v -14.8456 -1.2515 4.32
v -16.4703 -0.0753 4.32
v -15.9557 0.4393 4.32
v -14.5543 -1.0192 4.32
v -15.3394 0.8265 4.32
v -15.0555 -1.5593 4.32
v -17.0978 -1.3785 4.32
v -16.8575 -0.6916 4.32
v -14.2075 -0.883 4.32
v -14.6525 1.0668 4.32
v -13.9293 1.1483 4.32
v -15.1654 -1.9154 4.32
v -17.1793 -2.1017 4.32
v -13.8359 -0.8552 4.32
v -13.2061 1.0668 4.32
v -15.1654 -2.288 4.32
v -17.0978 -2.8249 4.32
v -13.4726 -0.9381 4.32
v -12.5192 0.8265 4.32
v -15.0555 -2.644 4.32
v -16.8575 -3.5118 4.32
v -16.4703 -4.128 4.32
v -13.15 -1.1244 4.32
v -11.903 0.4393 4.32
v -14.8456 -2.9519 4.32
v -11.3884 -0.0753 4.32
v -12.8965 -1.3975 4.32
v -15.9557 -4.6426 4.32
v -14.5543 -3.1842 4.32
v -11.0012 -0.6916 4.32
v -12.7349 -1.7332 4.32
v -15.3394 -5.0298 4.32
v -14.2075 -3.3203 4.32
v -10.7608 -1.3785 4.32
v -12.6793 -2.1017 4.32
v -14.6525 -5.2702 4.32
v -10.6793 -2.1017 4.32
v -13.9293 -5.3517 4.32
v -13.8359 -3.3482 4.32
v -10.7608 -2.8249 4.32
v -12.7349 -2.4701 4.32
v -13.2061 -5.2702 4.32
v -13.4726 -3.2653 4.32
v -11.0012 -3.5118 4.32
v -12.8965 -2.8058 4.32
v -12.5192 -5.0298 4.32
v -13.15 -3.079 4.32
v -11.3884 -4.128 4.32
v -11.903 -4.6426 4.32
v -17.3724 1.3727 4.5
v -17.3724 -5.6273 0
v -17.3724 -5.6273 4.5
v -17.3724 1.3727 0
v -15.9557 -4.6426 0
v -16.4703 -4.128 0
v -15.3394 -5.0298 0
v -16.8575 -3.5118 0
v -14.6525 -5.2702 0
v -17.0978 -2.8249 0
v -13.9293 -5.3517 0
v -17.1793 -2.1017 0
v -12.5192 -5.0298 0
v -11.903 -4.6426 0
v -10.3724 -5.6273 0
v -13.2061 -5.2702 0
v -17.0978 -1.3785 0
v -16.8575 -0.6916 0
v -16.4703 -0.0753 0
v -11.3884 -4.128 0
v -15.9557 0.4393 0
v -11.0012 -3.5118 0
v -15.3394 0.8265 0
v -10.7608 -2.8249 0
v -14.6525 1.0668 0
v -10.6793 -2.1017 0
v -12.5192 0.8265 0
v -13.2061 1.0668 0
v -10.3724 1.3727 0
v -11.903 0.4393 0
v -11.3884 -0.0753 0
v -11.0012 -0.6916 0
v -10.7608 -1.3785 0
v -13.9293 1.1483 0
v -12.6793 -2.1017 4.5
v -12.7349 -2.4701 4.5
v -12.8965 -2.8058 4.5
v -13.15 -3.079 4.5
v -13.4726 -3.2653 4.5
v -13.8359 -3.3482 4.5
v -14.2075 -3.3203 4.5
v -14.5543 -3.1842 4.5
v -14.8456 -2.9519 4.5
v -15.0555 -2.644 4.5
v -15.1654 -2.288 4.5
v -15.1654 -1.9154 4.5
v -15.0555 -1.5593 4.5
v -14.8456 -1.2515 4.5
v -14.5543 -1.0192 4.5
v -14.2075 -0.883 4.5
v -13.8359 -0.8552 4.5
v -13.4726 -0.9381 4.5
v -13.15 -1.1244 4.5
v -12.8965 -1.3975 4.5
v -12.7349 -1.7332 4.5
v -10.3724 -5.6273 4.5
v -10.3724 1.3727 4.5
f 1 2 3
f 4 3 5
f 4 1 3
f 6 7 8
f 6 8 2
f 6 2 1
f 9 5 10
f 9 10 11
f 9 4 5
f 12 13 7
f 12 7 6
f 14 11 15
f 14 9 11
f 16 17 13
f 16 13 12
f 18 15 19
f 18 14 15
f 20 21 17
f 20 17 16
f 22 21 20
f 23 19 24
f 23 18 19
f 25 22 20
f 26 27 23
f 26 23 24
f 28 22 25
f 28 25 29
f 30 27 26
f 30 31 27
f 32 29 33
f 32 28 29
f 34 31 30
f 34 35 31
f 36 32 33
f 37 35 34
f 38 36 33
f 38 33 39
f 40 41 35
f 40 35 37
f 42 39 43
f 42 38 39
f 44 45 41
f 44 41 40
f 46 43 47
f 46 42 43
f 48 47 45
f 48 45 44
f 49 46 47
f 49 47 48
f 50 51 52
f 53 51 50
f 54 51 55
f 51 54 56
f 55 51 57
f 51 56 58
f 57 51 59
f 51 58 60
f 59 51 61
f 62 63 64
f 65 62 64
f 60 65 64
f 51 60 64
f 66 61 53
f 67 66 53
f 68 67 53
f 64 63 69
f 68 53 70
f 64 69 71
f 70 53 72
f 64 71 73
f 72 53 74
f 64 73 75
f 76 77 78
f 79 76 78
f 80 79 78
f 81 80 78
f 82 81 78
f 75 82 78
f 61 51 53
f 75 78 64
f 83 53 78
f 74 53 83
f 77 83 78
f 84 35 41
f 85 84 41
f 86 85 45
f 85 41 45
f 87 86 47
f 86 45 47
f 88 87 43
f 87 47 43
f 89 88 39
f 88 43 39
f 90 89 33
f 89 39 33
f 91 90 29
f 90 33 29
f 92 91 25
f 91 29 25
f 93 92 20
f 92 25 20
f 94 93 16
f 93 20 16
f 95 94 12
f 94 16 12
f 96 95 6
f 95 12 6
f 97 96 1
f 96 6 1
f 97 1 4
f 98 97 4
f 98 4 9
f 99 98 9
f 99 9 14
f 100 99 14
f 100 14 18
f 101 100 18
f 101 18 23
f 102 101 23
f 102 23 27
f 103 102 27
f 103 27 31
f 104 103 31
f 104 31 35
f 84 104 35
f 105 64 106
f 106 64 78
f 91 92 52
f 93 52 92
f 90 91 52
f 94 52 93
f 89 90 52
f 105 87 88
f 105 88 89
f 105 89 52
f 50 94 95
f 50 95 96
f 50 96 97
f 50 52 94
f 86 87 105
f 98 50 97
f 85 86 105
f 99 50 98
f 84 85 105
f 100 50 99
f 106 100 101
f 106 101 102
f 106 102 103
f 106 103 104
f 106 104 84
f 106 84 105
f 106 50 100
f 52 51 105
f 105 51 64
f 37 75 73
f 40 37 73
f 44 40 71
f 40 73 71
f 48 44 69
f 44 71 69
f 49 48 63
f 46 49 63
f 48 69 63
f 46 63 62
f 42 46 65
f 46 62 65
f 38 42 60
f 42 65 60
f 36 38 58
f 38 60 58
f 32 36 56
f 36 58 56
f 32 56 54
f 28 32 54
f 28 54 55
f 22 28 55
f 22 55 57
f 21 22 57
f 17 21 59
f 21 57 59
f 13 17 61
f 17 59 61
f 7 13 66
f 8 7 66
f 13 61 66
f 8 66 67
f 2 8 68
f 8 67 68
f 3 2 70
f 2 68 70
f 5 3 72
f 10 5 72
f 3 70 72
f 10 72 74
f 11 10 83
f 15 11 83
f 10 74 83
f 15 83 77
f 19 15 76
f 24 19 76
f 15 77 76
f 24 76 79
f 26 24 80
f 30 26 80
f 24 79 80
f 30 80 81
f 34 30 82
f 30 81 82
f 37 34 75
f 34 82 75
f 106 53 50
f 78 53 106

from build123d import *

# Parameters (mm, degrees)
F0_W     = 7
F0_H     = 7
F1_DEPTH = 4.5
F3_R     = 1.25
F4_DEPTH = 25
F3_R_2   = 3.25
F5_DEPTH = 4.32


with BuildPart() as f1:
    # F0 (on Top) → F1 (new body)
    with BuildSketch(Plane.XY):
        with Locations((-13.872448, -2.127344)):
            Rectangle(F0_W, F0_H)
    extrude(amount=F1_DEPTH)

    # F3 (on face) → F4 (cut)
    with BuildSketch(Plane(origin=(0, 0, 0), x_dir=(1, 0, 0), z_dir=(0, 0, -1))):
        with Locations((-13.92932, 2.101687)):
            Circle(F3_R)
    extrude(amount=-F4_DEPTH, mode=Mode.SUBTRACT)

    # F3 (on face) → F5 (cut)
    with BuildSketch(Plane(origin=(0, 0, 0), x_dir=(1, 0, 0), z_dir=(0, 0, -1))):
        with Locations((-13.92932, 2.101687)):
            Circle(F3_R_2)
        with Locations((-13.92932, 2.101687)):
            Circle(F3_R, mode=Mode.SUBTRACT)
    extrude(amount=-F5_DEPTH, mode=Mode.SUBTRACT)


solid = f1.part
